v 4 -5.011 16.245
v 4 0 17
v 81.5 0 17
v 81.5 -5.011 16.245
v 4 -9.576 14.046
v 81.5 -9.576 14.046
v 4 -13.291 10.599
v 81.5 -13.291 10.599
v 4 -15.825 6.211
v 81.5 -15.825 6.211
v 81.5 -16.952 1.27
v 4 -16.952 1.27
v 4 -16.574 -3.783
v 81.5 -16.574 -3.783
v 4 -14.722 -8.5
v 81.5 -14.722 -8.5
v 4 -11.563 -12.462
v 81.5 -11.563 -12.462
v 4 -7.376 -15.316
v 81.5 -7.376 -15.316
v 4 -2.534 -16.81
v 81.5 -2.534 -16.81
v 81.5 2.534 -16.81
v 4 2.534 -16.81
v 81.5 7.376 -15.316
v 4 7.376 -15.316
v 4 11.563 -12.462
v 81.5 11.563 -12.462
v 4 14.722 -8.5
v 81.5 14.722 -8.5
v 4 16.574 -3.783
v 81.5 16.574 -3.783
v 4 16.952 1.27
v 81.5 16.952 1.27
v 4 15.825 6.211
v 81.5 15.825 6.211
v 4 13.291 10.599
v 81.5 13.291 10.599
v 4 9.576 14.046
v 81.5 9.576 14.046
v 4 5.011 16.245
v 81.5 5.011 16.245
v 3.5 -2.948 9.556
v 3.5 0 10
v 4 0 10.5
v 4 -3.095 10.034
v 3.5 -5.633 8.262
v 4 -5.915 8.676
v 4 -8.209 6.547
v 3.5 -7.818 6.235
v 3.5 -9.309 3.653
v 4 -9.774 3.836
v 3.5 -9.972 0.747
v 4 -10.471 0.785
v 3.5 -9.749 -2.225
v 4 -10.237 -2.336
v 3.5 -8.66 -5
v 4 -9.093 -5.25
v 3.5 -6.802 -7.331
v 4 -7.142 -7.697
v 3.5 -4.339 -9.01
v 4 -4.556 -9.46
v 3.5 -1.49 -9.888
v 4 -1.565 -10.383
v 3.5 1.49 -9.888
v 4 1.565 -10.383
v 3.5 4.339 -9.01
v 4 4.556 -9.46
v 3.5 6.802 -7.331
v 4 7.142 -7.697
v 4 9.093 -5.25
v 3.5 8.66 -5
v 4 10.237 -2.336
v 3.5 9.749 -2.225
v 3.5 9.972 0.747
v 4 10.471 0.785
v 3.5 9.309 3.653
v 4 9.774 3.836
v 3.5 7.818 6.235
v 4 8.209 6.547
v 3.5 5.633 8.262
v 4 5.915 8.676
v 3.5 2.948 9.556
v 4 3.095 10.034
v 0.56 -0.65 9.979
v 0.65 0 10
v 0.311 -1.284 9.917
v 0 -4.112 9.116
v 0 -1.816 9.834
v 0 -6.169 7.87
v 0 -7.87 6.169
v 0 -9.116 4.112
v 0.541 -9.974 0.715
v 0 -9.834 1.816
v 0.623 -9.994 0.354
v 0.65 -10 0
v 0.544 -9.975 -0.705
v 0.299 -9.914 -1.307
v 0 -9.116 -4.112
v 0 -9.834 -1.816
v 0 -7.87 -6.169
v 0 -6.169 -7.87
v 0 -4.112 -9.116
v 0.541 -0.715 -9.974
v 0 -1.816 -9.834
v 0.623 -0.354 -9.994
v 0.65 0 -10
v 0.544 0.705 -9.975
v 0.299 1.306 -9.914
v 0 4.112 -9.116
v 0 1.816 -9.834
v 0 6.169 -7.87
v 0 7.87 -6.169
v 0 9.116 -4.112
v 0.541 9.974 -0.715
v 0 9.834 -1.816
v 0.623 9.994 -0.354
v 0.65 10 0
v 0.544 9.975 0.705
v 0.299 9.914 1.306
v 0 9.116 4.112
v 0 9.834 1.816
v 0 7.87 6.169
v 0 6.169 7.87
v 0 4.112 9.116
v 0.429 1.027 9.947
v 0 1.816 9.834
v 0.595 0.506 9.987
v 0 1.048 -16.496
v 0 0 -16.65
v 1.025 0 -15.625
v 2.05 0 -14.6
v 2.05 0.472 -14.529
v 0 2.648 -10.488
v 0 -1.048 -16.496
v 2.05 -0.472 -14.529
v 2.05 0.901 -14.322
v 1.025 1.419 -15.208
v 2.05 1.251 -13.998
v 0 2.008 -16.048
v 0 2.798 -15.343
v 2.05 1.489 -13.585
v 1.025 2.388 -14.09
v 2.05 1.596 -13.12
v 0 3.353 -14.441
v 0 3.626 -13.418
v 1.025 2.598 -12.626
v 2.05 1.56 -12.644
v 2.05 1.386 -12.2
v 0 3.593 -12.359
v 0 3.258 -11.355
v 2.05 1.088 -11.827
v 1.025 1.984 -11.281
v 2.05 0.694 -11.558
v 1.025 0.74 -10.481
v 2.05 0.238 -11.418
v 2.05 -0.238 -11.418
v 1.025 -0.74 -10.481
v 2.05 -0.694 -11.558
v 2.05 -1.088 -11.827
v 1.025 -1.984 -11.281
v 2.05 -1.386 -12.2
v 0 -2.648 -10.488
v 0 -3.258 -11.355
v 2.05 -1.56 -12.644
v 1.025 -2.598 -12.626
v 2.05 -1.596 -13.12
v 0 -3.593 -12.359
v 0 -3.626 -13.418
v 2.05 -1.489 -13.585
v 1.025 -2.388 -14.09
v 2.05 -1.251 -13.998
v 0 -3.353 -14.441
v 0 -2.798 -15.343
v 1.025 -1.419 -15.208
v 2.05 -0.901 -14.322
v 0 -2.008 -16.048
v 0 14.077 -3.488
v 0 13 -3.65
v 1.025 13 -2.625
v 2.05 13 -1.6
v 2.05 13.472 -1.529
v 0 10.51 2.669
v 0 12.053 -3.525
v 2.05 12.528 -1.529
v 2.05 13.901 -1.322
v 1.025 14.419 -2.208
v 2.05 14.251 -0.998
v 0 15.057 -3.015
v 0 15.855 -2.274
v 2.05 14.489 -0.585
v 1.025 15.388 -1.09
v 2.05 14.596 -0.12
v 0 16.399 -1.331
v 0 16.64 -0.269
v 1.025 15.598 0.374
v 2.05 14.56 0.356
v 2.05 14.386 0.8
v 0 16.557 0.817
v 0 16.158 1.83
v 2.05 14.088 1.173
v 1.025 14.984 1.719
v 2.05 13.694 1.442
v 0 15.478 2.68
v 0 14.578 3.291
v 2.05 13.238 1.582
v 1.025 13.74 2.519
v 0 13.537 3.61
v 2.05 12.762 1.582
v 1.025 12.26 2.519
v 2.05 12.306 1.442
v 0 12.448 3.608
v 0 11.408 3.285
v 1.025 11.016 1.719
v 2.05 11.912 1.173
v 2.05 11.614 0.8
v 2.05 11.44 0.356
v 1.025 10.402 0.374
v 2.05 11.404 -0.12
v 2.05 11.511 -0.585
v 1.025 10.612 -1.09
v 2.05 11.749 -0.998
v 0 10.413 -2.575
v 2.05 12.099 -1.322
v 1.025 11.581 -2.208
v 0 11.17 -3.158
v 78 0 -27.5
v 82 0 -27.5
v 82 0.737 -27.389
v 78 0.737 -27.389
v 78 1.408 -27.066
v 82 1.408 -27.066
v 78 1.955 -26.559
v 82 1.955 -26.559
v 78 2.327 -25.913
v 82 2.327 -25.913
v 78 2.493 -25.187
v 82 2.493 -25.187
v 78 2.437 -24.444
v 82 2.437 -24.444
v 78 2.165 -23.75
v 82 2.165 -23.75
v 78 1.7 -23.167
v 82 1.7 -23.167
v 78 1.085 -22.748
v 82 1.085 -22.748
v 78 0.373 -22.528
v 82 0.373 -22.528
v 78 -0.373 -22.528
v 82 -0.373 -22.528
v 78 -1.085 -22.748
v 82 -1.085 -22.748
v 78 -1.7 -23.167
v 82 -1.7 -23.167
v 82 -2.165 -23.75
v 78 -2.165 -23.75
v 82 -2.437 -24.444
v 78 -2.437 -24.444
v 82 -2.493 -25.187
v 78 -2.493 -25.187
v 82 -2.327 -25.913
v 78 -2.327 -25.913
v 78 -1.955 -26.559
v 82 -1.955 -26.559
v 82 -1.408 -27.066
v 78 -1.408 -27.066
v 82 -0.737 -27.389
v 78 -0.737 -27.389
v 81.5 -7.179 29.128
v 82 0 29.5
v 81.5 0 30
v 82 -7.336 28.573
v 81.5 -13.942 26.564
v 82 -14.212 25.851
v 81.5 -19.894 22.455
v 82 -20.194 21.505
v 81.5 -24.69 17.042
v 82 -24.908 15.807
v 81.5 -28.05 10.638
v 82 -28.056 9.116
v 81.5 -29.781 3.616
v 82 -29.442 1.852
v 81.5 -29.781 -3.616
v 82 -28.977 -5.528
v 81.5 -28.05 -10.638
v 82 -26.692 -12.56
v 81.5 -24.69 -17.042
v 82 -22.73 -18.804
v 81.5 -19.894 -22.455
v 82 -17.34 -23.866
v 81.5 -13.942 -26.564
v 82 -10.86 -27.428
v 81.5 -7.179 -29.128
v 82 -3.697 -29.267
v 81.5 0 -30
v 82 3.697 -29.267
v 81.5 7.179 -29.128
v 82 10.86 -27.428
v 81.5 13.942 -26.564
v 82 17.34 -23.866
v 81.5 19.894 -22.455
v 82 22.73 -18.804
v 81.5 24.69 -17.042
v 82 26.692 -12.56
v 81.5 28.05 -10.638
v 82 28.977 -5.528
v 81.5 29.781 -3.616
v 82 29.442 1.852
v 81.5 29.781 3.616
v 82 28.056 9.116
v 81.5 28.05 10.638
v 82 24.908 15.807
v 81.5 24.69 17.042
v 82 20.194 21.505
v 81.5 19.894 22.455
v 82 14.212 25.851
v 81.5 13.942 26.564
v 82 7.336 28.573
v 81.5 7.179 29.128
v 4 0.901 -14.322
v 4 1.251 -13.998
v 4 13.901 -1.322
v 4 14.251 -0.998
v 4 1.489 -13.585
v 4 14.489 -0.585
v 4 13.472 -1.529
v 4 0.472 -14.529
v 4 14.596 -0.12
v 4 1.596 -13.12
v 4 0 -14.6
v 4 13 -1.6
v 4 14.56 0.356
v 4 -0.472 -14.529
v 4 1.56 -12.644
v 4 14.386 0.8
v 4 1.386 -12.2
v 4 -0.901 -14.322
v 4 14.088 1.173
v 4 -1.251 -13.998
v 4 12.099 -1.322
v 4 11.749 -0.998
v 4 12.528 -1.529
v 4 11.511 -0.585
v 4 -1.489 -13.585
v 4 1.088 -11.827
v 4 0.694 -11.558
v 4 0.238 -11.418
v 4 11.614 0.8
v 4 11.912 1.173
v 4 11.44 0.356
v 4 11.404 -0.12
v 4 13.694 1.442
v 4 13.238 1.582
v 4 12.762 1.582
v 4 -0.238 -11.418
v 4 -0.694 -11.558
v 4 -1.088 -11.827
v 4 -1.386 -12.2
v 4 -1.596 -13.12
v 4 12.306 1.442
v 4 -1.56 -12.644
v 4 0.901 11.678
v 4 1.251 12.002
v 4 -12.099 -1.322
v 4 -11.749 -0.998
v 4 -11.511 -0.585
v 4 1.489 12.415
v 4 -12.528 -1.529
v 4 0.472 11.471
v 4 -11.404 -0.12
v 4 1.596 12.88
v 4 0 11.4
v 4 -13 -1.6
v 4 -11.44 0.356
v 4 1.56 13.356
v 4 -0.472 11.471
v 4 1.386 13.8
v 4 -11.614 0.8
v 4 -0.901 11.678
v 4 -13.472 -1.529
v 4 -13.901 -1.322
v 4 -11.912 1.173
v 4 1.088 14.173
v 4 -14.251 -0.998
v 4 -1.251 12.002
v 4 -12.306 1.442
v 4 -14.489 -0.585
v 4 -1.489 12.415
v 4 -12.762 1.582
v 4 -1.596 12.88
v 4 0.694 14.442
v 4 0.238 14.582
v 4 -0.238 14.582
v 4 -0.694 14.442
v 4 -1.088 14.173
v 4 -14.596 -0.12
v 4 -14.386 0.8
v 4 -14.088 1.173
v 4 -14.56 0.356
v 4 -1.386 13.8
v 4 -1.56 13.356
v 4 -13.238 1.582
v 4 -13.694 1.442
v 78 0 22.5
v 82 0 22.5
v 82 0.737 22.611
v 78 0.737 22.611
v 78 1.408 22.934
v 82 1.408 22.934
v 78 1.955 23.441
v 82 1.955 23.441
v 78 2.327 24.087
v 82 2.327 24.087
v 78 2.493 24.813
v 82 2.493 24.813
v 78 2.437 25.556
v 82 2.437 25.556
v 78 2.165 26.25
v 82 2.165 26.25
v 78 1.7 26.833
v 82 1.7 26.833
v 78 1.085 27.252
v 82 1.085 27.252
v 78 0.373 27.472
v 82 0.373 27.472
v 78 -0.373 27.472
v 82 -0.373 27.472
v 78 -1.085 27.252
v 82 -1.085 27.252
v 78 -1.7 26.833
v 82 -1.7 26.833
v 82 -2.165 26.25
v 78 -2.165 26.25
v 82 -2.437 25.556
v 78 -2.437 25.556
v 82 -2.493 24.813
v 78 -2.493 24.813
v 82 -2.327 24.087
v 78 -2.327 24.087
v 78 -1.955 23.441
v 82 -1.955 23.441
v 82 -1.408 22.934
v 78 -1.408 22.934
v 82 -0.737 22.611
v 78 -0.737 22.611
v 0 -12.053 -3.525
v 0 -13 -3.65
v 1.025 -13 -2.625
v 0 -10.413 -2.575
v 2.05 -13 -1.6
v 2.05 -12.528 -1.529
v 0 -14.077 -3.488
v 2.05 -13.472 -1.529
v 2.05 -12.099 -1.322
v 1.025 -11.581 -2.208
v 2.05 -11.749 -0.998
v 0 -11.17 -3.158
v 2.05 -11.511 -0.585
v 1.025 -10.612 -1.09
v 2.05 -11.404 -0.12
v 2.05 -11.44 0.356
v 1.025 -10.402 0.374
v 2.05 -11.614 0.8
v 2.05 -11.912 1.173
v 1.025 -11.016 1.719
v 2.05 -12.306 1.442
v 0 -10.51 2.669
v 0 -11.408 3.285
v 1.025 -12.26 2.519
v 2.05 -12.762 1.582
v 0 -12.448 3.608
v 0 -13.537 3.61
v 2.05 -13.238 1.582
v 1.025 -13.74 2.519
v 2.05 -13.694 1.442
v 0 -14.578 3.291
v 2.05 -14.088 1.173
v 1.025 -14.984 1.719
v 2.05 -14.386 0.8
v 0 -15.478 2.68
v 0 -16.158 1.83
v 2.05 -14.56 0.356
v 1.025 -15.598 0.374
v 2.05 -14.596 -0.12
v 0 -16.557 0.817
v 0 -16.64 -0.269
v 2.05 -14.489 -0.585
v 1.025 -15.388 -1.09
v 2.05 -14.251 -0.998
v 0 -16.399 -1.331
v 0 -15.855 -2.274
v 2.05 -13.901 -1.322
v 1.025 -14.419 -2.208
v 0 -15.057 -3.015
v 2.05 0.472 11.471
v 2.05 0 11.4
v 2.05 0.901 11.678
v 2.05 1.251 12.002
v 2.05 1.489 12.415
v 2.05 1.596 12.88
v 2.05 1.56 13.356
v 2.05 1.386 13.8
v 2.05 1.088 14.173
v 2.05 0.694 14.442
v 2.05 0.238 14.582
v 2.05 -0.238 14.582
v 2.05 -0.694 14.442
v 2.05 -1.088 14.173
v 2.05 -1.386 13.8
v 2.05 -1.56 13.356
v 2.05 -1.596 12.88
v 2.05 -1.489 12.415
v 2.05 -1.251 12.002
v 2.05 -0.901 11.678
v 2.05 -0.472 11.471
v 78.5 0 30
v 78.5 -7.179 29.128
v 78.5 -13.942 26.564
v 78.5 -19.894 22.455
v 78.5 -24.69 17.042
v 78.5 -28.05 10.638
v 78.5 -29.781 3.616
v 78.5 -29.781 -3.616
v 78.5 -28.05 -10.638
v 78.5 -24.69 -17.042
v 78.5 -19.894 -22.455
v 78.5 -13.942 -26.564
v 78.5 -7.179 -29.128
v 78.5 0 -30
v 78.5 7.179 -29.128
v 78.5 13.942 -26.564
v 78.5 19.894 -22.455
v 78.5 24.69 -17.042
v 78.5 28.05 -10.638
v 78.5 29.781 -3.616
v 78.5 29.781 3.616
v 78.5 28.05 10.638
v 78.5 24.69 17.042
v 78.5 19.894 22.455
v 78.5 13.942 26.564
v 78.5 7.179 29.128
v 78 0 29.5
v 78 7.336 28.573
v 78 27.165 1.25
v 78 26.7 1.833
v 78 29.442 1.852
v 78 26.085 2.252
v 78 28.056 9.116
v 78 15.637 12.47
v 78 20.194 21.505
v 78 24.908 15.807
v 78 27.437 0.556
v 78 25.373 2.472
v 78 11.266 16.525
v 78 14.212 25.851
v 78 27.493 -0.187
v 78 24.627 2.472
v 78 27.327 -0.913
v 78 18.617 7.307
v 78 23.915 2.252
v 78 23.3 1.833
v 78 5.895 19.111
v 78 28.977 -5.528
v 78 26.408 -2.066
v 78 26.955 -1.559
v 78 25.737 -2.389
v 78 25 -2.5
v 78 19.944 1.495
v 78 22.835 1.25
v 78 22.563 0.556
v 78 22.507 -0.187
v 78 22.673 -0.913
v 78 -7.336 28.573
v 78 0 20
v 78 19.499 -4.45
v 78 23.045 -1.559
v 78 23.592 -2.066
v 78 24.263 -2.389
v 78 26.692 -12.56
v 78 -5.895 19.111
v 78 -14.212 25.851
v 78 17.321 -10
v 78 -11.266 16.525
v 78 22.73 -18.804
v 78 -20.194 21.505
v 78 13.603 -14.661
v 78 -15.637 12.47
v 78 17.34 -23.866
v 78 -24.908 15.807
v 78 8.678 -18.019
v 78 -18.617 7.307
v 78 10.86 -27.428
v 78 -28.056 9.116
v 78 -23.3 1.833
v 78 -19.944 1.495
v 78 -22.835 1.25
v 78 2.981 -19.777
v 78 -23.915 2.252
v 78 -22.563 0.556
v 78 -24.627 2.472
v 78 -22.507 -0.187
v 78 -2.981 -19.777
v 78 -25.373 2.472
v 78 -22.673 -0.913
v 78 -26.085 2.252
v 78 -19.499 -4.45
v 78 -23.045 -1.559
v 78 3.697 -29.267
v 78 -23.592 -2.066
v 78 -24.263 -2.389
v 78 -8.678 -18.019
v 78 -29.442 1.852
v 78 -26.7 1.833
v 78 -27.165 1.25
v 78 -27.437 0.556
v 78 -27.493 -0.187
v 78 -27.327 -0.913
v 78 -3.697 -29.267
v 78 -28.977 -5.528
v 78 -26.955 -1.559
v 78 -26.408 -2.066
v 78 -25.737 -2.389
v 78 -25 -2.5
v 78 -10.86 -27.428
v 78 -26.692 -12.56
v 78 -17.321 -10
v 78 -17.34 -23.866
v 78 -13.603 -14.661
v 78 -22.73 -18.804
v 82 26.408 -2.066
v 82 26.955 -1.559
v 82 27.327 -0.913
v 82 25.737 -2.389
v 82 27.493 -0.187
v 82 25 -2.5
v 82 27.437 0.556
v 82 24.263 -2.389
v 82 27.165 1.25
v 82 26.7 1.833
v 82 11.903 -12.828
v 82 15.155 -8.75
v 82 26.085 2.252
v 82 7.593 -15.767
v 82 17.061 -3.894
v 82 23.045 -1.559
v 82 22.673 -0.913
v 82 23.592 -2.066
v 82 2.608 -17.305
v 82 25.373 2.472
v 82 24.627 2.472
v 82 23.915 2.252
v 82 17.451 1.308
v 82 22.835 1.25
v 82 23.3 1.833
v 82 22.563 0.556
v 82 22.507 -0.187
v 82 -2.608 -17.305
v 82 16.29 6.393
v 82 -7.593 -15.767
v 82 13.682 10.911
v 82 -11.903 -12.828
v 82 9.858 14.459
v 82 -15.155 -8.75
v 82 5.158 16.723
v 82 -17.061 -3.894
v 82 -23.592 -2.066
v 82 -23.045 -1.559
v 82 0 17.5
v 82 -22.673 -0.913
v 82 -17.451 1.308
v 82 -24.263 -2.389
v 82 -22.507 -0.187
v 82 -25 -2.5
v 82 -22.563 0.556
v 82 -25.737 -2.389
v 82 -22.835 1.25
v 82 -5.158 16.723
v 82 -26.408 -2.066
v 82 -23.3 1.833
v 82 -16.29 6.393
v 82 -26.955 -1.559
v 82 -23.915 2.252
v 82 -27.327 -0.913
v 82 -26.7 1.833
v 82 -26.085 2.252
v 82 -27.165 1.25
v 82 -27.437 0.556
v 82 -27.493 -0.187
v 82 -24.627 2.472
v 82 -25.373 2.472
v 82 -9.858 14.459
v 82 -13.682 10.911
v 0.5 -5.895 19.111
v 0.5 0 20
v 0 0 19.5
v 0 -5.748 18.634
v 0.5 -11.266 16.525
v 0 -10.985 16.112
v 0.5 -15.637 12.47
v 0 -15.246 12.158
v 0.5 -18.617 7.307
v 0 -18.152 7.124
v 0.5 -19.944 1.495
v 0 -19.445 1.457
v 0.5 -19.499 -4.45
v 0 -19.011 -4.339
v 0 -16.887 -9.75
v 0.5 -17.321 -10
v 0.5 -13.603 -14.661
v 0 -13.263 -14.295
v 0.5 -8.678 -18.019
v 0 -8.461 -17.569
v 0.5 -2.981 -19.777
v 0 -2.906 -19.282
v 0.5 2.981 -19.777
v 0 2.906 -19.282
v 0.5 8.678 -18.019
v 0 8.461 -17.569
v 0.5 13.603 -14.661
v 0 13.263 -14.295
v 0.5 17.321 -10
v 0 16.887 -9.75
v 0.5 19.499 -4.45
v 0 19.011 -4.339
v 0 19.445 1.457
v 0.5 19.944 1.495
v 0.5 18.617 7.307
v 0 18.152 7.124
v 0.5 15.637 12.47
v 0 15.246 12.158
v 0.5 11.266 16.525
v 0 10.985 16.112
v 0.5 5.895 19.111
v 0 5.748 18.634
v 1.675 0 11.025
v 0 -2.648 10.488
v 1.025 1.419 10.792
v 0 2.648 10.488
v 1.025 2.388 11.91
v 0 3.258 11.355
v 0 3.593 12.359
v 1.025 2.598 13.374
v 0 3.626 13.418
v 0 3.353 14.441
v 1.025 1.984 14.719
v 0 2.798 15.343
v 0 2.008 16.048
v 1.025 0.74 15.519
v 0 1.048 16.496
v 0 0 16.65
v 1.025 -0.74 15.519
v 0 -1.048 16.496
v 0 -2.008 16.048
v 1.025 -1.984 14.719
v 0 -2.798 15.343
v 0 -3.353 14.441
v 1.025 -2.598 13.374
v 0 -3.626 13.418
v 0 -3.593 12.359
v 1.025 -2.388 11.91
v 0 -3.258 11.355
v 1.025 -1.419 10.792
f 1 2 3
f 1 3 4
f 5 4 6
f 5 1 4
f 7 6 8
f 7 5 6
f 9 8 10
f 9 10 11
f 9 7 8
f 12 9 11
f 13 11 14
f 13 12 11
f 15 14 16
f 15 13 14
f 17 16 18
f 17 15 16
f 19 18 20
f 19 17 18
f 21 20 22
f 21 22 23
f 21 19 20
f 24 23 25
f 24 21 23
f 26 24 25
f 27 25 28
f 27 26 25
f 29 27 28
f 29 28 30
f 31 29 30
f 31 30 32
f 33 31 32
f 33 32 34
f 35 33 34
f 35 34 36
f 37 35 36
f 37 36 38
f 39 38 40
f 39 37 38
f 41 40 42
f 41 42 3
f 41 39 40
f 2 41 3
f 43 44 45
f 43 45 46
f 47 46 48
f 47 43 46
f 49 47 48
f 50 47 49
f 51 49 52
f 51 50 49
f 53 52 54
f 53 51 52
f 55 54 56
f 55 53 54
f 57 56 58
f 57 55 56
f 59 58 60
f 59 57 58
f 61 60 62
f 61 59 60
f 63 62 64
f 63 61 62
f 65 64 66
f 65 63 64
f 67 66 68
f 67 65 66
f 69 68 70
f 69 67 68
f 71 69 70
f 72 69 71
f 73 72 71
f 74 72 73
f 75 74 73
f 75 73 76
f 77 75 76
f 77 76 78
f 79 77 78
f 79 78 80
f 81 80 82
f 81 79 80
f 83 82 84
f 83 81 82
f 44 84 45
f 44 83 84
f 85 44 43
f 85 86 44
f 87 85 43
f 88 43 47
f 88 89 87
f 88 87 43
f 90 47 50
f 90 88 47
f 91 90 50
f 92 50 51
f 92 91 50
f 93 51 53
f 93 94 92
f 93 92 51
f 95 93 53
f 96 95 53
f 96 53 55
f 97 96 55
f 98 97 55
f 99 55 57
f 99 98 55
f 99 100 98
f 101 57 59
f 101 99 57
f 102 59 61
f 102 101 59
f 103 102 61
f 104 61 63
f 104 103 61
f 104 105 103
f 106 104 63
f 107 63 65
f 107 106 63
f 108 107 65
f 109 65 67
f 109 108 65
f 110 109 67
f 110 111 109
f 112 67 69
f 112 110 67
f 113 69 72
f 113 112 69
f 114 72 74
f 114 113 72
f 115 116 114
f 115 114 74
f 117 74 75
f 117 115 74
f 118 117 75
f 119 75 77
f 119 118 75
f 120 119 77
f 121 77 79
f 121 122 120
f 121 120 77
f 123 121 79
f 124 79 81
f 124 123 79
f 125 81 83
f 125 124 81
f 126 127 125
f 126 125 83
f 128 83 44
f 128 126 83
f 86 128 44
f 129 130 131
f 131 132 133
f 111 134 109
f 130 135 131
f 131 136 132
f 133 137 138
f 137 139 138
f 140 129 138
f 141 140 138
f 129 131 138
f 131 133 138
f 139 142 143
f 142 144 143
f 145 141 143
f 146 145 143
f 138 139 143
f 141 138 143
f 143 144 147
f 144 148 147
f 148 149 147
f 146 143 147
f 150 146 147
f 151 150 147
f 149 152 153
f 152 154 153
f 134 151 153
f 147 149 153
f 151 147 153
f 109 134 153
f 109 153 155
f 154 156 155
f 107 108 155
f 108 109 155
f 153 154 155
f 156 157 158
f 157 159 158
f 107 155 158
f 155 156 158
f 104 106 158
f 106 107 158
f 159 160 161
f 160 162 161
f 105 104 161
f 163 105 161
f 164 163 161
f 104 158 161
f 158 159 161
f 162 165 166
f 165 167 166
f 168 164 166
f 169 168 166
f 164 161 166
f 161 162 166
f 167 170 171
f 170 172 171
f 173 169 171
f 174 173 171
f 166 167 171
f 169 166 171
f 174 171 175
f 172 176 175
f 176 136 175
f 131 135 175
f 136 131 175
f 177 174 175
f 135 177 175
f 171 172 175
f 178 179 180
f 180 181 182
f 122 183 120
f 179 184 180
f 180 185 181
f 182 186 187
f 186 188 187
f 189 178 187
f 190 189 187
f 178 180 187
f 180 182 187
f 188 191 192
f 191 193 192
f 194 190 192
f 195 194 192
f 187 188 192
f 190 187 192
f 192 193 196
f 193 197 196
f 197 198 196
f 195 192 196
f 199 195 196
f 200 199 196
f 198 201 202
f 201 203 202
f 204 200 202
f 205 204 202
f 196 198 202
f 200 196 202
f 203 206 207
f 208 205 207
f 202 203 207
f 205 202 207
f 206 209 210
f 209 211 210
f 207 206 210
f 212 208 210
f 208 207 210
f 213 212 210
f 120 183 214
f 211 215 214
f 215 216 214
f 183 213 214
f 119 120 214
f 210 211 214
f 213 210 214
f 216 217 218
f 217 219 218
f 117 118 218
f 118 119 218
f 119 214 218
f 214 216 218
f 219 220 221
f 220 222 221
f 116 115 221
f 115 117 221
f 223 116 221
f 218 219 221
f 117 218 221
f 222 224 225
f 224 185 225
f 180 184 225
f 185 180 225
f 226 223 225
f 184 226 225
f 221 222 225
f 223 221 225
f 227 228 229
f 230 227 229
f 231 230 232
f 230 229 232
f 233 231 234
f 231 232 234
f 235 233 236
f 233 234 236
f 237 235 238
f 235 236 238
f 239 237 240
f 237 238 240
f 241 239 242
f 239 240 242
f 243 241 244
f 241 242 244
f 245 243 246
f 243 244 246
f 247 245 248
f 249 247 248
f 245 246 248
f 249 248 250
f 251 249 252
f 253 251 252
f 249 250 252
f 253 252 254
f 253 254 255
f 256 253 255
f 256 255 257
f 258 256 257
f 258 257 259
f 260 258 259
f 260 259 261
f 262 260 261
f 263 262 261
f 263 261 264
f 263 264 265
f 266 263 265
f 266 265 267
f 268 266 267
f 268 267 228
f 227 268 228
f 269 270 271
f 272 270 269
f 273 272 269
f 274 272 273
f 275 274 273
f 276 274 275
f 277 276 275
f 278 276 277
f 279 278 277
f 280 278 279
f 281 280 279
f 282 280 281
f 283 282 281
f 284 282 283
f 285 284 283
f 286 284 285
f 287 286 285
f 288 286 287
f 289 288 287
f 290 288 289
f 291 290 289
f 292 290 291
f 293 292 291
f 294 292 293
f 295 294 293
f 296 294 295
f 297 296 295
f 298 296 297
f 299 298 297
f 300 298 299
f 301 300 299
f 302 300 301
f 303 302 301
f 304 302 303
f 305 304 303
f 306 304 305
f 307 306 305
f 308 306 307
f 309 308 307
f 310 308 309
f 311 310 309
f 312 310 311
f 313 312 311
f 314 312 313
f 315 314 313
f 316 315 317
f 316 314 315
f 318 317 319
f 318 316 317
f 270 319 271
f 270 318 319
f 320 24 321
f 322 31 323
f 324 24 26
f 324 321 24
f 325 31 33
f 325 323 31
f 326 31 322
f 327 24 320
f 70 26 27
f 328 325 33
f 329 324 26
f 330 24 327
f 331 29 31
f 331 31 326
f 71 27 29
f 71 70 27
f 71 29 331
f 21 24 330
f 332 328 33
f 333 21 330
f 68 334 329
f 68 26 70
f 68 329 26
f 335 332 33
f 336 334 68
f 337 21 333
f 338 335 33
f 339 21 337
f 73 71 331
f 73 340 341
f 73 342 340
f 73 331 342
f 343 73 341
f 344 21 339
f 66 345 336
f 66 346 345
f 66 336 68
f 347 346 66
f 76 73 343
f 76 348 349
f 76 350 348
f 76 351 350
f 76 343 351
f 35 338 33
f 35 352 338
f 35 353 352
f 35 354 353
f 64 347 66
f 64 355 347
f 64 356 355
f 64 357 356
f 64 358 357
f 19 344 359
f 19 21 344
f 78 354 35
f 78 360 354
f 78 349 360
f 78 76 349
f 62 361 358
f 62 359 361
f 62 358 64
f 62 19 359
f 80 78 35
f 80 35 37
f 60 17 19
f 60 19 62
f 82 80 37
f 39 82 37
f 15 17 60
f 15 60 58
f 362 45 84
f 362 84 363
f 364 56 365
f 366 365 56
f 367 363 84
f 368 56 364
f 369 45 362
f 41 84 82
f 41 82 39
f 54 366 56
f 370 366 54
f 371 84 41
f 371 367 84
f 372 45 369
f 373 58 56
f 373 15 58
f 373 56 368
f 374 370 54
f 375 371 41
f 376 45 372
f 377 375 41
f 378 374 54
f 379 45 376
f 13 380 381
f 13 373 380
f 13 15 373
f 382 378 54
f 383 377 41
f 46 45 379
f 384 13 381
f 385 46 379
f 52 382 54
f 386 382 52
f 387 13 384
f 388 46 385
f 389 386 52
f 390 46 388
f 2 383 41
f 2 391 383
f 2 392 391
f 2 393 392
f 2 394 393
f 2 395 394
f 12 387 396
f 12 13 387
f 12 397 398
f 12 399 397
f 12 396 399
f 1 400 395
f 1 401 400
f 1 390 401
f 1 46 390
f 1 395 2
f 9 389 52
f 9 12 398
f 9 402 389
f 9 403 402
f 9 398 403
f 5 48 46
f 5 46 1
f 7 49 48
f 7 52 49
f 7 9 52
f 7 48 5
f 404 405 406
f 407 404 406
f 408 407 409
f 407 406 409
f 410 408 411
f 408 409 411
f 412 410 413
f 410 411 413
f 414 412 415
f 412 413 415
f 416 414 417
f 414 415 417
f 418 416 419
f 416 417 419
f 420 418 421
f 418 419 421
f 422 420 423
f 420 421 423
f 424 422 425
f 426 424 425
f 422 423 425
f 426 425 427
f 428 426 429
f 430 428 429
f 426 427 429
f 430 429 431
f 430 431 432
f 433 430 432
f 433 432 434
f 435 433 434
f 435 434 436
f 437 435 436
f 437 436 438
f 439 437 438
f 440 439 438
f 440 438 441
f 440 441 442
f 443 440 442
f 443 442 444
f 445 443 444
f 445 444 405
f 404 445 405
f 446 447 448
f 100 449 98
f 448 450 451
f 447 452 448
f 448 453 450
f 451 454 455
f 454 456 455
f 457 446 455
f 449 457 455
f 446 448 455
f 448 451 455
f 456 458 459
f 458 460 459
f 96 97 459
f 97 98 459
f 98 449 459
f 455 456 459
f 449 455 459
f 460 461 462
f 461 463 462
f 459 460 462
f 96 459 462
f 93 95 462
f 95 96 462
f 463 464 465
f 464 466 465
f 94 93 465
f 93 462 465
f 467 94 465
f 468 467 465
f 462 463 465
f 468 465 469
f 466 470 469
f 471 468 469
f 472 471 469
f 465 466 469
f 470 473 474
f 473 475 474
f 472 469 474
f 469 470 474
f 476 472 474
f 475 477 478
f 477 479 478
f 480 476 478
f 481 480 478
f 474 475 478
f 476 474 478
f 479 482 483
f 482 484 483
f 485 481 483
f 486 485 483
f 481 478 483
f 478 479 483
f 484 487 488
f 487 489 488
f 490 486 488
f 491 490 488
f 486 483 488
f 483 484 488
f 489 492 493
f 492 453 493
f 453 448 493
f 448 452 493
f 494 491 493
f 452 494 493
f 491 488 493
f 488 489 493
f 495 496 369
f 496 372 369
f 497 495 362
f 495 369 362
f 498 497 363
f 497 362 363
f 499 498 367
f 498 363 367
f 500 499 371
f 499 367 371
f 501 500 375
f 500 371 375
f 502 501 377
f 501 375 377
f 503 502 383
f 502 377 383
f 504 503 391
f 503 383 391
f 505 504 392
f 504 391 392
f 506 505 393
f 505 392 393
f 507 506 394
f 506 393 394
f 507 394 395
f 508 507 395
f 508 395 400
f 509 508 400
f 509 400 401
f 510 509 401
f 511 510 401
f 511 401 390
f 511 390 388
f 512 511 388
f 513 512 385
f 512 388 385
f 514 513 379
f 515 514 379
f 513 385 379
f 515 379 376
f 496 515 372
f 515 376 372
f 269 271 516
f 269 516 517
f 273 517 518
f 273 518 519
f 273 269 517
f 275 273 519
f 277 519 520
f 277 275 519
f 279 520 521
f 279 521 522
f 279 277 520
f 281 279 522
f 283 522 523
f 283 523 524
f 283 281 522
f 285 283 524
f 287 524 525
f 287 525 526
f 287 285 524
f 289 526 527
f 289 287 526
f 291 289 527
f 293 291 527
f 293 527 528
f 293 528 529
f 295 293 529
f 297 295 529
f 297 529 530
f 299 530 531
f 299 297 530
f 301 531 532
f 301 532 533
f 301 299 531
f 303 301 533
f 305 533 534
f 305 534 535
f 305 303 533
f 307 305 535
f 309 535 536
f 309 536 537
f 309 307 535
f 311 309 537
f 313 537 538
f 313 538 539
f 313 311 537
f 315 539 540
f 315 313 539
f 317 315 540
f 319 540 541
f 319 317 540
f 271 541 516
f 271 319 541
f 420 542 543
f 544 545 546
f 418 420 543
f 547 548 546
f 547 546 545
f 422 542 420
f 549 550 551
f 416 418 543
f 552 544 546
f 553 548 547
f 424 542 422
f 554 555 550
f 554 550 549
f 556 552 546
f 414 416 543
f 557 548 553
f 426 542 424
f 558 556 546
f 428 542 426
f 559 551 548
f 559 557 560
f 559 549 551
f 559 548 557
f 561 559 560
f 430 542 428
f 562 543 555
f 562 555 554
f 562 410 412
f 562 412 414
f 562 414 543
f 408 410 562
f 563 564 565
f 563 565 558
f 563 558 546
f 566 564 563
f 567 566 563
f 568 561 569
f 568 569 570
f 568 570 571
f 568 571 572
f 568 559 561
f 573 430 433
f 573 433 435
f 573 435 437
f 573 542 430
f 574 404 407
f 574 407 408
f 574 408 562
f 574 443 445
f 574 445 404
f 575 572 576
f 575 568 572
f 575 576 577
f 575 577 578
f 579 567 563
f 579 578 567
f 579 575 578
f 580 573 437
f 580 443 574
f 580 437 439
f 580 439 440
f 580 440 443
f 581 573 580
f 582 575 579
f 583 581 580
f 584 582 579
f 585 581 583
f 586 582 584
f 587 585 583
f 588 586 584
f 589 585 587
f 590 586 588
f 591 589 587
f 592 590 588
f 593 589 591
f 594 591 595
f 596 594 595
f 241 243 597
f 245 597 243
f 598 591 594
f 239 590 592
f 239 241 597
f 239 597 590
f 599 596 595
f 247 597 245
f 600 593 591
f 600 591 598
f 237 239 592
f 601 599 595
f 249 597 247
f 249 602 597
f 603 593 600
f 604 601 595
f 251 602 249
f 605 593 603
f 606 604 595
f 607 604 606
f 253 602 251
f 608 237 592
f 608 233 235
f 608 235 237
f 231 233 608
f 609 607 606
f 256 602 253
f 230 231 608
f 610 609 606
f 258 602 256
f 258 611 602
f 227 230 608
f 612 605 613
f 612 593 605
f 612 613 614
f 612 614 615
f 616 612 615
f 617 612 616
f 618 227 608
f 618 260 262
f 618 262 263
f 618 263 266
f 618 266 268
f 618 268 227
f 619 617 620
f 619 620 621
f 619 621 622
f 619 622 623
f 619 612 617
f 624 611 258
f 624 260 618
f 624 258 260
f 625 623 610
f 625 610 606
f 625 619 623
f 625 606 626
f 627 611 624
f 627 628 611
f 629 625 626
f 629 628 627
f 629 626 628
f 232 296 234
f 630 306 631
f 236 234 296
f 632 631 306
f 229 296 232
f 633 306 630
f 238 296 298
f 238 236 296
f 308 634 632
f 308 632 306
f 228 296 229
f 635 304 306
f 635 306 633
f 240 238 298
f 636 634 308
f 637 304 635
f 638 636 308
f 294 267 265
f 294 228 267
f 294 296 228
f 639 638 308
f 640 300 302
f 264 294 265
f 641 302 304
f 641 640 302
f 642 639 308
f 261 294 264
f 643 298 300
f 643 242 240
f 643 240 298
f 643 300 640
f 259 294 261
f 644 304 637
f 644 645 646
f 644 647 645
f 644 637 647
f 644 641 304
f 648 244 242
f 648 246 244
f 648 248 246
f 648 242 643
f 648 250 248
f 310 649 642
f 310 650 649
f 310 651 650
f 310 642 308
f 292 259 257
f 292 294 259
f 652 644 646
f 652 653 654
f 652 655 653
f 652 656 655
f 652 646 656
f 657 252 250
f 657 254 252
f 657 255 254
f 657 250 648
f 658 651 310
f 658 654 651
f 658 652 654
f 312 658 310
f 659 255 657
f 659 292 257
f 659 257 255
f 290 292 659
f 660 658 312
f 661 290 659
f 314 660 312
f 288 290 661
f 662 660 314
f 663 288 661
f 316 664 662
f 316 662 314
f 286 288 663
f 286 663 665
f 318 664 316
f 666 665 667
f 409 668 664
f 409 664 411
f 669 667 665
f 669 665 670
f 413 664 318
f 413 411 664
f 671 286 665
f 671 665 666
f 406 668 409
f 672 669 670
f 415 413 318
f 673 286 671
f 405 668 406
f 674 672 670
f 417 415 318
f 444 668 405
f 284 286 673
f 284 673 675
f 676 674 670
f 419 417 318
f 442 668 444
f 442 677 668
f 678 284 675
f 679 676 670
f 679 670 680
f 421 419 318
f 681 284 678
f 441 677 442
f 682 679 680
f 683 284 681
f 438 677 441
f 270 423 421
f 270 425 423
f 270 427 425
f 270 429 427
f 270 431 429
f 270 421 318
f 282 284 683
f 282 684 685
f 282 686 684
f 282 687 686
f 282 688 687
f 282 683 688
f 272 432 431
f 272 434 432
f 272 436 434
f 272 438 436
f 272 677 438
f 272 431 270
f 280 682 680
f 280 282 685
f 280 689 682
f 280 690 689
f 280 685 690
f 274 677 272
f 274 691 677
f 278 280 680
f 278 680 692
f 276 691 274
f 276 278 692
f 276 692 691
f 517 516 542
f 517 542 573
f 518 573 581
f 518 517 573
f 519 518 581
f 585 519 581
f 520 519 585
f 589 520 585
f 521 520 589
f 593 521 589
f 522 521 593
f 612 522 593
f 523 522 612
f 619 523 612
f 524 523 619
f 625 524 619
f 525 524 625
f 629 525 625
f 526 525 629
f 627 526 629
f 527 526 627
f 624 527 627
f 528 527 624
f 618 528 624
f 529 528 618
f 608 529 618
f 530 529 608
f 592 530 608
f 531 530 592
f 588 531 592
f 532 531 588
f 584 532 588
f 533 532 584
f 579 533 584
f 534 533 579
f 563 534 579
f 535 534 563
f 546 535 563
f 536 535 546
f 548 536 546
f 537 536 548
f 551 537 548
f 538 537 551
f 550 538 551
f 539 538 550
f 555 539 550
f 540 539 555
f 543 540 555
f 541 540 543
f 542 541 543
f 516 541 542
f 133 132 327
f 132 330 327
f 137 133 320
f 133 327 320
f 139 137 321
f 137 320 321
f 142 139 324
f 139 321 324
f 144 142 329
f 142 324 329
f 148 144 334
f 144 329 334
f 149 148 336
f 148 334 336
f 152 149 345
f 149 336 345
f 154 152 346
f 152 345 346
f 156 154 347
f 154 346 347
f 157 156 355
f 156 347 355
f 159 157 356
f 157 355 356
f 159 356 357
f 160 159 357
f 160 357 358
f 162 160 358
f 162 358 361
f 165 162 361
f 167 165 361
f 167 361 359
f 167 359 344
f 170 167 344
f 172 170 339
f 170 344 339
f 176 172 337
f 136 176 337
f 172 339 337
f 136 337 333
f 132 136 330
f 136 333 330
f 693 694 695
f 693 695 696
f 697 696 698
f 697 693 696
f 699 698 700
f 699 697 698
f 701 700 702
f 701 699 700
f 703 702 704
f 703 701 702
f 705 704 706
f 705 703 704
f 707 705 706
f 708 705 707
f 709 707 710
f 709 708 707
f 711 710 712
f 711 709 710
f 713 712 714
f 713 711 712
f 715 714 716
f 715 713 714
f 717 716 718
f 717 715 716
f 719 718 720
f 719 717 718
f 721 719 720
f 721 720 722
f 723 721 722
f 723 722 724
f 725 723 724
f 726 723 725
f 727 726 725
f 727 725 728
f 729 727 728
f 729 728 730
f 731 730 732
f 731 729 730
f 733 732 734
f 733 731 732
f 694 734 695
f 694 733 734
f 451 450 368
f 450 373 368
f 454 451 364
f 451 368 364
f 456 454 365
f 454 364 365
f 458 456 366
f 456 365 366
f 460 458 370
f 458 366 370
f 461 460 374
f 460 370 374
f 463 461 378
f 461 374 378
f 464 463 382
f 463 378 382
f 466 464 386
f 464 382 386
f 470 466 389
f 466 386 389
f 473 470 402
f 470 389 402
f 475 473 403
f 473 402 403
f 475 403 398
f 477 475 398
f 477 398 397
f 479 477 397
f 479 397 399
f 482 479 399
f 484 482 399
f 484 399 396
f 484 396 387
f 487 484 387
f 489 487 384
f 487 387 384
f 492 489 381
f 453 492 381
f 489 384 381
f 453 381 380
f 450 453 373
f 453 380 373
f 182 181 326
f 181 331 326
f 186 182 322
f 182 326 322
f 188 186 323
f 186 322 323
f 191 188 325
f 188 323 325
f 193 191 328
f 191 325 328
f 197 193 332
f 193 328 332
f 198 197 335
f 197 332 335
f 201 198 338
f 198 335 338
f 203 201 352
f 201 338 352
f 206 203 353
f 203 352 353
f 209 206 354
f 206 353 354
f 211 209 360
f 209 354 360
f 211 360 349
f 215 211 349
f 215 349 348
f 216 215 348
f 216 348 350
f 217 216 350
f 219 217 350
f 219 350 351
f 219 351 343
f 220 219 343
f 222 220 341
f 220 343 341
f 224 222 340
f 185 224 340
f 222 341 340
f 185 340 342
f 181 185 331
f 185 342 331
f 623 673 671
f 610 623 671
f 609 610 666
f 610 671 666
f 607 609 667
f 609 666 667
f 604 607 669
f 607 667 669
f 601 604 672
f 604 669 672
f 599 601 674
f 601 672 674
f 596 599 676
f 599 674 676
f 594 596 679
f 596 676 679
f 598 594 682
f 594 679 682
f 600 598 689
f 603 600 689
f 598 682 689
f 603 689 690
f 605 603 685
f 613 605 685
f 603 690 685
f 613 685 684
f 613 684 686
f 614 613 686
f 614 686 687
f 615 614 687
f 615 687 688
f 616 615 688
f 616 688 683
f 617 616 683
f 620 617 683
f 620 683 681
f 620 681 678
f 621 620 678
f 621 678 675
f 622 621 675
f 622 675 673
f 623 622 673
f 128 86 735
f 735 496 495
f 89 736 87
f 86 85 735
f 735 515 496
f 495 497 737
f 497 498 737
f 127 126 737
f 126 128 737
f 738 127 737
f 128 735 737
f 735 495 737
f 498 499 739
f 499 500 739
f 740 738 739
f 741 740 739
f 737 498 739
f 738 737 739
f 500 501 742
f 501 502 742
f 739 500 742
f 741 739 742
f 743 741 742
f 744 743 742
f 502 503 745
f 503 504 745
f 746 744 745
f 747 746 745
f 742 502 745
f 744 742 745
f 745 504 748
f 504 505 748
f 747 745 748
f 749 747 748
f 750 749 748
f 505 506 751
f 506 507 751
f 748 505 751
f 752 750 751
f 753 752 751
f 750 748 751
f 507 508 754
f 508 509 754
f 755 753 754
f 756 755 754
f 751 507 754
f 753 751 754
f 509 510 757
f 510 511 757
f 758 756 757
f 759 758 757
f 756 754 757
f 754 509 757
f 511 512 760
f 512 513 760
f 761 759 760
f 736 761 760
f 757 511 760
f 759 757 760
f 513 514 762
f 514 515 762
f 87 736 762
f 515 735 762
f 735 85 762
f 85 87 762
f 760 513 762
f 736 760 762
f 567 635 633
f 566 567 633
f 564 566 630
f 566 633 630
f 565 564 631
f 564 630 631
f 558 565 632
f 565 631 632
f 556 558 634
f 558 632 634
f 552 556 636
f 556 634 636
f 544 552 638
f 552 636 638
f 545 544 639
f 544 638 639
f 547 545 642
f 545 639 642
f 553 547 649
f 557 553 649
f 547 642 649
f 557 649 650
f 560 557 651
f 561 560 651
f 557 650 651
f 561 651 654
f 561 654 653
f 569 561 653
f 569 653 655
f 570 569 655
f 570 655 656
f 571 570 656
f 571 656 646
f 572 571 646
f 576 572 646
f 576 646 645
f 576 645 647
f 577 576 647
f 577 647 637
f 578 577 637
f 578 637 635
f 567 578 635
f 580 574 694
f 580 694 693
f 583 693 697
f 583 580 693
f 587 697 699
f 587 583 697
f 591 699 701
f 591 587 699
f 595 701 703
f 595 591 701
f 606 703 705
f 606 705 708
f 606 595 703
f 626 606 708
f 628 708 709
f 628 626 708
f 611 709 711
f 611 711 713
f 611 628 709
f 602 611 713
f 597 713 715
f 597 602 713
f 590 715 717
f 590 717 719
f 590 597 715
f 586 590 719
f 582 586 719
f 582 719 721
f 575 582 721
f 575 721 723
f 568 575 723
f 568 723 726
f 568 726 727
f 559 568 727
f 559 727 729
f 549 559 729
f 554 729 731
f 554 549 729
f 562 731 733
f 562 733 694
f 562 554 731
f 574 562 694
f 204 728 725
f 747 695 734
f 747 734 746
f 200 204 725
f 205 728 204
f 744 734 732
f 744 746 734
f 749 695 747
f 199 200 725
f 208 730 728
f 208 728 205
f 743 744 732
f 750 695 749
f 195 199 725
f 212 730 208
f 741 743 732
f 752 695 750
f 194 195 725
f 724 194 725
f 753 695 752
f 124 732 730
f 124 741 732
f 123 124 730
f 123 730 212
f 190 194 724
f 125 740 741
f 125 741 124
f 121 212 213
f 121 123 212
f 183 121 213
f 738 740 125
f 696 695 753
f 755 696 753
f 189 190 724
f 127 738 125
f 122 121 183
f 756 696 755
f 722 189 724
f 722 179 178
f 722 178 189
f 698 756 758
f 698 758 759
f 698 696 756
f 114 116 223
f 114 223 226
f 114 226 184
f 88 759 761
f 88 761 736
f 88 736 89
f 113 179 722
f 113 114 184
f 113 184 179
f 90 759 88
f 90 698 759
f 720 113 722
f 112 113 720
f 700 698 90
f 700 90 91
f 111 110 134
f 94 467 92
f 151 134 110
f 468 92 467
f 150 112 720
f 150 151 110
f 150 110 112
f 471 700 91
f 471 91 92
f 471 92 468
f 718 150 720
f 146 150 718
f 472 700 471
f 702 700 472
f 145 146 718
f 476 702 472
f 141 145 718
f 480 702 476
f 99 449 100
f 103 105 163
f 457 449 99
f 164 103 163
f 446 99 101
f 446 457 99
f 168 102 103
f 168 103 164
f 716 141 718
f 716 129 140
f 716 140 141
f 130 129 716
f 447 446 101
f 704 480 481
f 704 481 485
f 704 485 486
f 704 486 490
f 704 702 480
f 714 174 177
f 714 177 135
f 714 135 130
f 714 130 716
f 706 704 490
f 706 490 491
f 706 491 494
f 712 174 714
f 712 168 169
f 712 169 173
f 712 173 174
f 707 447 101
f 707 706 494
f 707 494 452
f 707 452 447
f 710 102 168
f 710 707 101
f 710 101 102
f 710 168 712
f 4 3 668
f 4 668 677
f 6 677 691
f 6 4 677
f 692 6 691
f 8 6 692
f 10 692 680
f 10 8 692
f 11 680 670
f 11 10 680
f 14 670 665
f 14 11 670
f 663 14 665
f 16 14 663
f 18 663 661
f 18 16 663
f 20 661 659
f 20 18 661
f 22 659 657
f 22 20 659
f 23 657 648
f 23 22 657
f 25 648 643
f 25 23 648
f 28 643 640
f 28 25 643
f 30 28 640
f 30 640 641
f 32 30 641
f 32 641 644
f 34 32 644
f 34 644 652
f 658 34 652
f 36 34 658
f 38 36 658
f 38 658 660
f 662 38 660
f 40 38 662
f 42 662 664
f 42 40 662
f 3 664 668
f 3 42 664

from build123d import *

# Parameters (mm, degrees)
CHANFREIN1_SIZE                                = 0.5
FRAISAGE_POUR_VIS_T_TE_FRAIS_E_M31_D           = 3.2
FRAISAGE_POUR_VIS_T_TE_FRAIS_E_M31_CSINK_D     = 7.3
FRAISAGE_POUR_VIS_T_TE_FRAIS_E_M31_CSINK_ANGLE = 90
ENL_V_MAT_EXTRU_1_REACH                        = 94.326
ESQUISSE5_R                                    = 2.5


with BuildPart() as part:
    # Esquisse1 → Révolution1 (revolve)
    with BuildSketch(Plane.XY, mode=Mode.PRIVATE) as r_volution1_sk:
        Polygon((0, 10), (0, 20), (78, 20), (78, 30), (82, 30), (82, 17), (4, 17), (4, 10), align=None)
    revolve(r_volution1_sk.sketch.rotate(Axis((0, 0, 0), (1, 0, 0)), 90), axis=Axis((0, 0, 0), (1, 0, 0)))

    # Chanfrein1
    chanfrein1_edges = [part.edges().sort_by_distance(p)[0] for p in [
        (0, 0, -20),
        (78, 0, -30),
        (82, 0, -30),
        (82, 0, -17),
        (4, 0, -10),
    ]]
    chamfer(chanfrein1_edges, length=CHANFREIN1_SIZE)

    # Fraisage pour vis à tête fraisée M31 (through all)
    with Locations(Plane.ZY):
        with Locations((0, 13), (13, 0), (0, -13), (-13, 0)):
            CounterSinkHole(FRAISAGE_POUR_VIS_T_TE_FRAIS_E_M31_D / 2, FRAISAGE_POUR_VIS_T_TE_FRAIS_E_M31_CSINK_D / 2, counter_sink_angle=FRAISAGE_POUR_VIS_T_TE_FRAIS_E_M31_CSINK_ANGLE)

    # Esquisse5 → Enlèv. mat.-Extru.1 (cut, up to next)
    with BuildSketch(Plane(origin=(82, 0, 0), x_dir=(0, 0, -1), z_dir=(1, 0, 0)), mode=Mode.PRIVATE) as enl_v_mat_extru_1_sk1:
        with Locations((0, 25)):
            Circle(ESQUISSE5_R)
    enl_v_mat_extru_1_tool1 = extrude(enl_v_mat_extru_1_sk1.sketch, amount=-ENL_V_MAT_EXTRU_1_REACH, mode=Mode.PRIVATE) & part.part
    # Esquisse5 → Enlèv. mat.-Extru.1 (cut, up to next)
    with BuildSketch(Plane(origin=(82, 0, 0), x_dir=(0, 0, -1), z_dir=(1, 0, 0)), mode=Mode.PRIVATE) as enl_v_mat_extru_1_sk2:
        with Locations((25, 0)):
            Circle(ESQUISSE5_R)
    enl_v_mat_extru_1_tool2 = extrude(enl_v_mat_extru_1_sk2.sketch, amount=-ENL_V_MAT_EXTRU_1_REACH, mode=Mode.PRIVATE) & part.part
    # Esquisse5 → Enlèv. mat.-Extru.1 (cut, up to next)
    with BuildSketch(Plane(origin=(82, 0, 0), x_dir=(0, 0, -1), z_dir=(1, 0, 0)), mode=Mode.PRIVATE) as enl_v_mat_extru_1_sk3:
        with Locations((-25, 0)):
            Circle(ESQUISSE5_R)
    enl_v_mat_extru_1_tool3 = extrude(enl_v_mat_extru_1_sk3.sketch, amount=-ENL_V_MAT_EXTRU_1_REACH, mode=Mode.PRIVATE) & part.part
    # Esquisse5 → Enlèv. mat.-Extru.1 (cut, up to next)
    with BuildSketch(Plane(origin=(82, 0, 0), x_dir=(0, 0, -1), z_dir=(1, 0, 0)), mode=Mode.PRIVATE) as enl_v_mat_extru_1_sk4:
        with Locations((0, -25)):
            Circle(ESQUISSE5_R)
    enl_v_mat_extru_1_tool4 = extrude(enl_v_mat_extru_1_sk4.sketch, amount=-ENL_V_MAT_EXTRU_1_REACH, mode=Mode.PRIVATE) & part.part
    add(enl_v_mat_extru_1_tool1.solids().sort_by_distance((82, 25, 0))[0], mode=Mode.SUBTRACT)
    add(enl_v_mat_extru_1_tool2.solids().sort_by_distance((82, 0, -25))[0], mode=Mode.SUBTRACT)
    add(enl_v_mat_extru_1_tool3.solids().sort_by_distance((82, 0, 25))[0], mode=Mode.SUBTRACT)
    add(enl_v_mat_extru_1_tool4.solids().sort_by_distance((82, -25, 0))[0], mode=Mode.SUBTRACT)


solid = part.part
